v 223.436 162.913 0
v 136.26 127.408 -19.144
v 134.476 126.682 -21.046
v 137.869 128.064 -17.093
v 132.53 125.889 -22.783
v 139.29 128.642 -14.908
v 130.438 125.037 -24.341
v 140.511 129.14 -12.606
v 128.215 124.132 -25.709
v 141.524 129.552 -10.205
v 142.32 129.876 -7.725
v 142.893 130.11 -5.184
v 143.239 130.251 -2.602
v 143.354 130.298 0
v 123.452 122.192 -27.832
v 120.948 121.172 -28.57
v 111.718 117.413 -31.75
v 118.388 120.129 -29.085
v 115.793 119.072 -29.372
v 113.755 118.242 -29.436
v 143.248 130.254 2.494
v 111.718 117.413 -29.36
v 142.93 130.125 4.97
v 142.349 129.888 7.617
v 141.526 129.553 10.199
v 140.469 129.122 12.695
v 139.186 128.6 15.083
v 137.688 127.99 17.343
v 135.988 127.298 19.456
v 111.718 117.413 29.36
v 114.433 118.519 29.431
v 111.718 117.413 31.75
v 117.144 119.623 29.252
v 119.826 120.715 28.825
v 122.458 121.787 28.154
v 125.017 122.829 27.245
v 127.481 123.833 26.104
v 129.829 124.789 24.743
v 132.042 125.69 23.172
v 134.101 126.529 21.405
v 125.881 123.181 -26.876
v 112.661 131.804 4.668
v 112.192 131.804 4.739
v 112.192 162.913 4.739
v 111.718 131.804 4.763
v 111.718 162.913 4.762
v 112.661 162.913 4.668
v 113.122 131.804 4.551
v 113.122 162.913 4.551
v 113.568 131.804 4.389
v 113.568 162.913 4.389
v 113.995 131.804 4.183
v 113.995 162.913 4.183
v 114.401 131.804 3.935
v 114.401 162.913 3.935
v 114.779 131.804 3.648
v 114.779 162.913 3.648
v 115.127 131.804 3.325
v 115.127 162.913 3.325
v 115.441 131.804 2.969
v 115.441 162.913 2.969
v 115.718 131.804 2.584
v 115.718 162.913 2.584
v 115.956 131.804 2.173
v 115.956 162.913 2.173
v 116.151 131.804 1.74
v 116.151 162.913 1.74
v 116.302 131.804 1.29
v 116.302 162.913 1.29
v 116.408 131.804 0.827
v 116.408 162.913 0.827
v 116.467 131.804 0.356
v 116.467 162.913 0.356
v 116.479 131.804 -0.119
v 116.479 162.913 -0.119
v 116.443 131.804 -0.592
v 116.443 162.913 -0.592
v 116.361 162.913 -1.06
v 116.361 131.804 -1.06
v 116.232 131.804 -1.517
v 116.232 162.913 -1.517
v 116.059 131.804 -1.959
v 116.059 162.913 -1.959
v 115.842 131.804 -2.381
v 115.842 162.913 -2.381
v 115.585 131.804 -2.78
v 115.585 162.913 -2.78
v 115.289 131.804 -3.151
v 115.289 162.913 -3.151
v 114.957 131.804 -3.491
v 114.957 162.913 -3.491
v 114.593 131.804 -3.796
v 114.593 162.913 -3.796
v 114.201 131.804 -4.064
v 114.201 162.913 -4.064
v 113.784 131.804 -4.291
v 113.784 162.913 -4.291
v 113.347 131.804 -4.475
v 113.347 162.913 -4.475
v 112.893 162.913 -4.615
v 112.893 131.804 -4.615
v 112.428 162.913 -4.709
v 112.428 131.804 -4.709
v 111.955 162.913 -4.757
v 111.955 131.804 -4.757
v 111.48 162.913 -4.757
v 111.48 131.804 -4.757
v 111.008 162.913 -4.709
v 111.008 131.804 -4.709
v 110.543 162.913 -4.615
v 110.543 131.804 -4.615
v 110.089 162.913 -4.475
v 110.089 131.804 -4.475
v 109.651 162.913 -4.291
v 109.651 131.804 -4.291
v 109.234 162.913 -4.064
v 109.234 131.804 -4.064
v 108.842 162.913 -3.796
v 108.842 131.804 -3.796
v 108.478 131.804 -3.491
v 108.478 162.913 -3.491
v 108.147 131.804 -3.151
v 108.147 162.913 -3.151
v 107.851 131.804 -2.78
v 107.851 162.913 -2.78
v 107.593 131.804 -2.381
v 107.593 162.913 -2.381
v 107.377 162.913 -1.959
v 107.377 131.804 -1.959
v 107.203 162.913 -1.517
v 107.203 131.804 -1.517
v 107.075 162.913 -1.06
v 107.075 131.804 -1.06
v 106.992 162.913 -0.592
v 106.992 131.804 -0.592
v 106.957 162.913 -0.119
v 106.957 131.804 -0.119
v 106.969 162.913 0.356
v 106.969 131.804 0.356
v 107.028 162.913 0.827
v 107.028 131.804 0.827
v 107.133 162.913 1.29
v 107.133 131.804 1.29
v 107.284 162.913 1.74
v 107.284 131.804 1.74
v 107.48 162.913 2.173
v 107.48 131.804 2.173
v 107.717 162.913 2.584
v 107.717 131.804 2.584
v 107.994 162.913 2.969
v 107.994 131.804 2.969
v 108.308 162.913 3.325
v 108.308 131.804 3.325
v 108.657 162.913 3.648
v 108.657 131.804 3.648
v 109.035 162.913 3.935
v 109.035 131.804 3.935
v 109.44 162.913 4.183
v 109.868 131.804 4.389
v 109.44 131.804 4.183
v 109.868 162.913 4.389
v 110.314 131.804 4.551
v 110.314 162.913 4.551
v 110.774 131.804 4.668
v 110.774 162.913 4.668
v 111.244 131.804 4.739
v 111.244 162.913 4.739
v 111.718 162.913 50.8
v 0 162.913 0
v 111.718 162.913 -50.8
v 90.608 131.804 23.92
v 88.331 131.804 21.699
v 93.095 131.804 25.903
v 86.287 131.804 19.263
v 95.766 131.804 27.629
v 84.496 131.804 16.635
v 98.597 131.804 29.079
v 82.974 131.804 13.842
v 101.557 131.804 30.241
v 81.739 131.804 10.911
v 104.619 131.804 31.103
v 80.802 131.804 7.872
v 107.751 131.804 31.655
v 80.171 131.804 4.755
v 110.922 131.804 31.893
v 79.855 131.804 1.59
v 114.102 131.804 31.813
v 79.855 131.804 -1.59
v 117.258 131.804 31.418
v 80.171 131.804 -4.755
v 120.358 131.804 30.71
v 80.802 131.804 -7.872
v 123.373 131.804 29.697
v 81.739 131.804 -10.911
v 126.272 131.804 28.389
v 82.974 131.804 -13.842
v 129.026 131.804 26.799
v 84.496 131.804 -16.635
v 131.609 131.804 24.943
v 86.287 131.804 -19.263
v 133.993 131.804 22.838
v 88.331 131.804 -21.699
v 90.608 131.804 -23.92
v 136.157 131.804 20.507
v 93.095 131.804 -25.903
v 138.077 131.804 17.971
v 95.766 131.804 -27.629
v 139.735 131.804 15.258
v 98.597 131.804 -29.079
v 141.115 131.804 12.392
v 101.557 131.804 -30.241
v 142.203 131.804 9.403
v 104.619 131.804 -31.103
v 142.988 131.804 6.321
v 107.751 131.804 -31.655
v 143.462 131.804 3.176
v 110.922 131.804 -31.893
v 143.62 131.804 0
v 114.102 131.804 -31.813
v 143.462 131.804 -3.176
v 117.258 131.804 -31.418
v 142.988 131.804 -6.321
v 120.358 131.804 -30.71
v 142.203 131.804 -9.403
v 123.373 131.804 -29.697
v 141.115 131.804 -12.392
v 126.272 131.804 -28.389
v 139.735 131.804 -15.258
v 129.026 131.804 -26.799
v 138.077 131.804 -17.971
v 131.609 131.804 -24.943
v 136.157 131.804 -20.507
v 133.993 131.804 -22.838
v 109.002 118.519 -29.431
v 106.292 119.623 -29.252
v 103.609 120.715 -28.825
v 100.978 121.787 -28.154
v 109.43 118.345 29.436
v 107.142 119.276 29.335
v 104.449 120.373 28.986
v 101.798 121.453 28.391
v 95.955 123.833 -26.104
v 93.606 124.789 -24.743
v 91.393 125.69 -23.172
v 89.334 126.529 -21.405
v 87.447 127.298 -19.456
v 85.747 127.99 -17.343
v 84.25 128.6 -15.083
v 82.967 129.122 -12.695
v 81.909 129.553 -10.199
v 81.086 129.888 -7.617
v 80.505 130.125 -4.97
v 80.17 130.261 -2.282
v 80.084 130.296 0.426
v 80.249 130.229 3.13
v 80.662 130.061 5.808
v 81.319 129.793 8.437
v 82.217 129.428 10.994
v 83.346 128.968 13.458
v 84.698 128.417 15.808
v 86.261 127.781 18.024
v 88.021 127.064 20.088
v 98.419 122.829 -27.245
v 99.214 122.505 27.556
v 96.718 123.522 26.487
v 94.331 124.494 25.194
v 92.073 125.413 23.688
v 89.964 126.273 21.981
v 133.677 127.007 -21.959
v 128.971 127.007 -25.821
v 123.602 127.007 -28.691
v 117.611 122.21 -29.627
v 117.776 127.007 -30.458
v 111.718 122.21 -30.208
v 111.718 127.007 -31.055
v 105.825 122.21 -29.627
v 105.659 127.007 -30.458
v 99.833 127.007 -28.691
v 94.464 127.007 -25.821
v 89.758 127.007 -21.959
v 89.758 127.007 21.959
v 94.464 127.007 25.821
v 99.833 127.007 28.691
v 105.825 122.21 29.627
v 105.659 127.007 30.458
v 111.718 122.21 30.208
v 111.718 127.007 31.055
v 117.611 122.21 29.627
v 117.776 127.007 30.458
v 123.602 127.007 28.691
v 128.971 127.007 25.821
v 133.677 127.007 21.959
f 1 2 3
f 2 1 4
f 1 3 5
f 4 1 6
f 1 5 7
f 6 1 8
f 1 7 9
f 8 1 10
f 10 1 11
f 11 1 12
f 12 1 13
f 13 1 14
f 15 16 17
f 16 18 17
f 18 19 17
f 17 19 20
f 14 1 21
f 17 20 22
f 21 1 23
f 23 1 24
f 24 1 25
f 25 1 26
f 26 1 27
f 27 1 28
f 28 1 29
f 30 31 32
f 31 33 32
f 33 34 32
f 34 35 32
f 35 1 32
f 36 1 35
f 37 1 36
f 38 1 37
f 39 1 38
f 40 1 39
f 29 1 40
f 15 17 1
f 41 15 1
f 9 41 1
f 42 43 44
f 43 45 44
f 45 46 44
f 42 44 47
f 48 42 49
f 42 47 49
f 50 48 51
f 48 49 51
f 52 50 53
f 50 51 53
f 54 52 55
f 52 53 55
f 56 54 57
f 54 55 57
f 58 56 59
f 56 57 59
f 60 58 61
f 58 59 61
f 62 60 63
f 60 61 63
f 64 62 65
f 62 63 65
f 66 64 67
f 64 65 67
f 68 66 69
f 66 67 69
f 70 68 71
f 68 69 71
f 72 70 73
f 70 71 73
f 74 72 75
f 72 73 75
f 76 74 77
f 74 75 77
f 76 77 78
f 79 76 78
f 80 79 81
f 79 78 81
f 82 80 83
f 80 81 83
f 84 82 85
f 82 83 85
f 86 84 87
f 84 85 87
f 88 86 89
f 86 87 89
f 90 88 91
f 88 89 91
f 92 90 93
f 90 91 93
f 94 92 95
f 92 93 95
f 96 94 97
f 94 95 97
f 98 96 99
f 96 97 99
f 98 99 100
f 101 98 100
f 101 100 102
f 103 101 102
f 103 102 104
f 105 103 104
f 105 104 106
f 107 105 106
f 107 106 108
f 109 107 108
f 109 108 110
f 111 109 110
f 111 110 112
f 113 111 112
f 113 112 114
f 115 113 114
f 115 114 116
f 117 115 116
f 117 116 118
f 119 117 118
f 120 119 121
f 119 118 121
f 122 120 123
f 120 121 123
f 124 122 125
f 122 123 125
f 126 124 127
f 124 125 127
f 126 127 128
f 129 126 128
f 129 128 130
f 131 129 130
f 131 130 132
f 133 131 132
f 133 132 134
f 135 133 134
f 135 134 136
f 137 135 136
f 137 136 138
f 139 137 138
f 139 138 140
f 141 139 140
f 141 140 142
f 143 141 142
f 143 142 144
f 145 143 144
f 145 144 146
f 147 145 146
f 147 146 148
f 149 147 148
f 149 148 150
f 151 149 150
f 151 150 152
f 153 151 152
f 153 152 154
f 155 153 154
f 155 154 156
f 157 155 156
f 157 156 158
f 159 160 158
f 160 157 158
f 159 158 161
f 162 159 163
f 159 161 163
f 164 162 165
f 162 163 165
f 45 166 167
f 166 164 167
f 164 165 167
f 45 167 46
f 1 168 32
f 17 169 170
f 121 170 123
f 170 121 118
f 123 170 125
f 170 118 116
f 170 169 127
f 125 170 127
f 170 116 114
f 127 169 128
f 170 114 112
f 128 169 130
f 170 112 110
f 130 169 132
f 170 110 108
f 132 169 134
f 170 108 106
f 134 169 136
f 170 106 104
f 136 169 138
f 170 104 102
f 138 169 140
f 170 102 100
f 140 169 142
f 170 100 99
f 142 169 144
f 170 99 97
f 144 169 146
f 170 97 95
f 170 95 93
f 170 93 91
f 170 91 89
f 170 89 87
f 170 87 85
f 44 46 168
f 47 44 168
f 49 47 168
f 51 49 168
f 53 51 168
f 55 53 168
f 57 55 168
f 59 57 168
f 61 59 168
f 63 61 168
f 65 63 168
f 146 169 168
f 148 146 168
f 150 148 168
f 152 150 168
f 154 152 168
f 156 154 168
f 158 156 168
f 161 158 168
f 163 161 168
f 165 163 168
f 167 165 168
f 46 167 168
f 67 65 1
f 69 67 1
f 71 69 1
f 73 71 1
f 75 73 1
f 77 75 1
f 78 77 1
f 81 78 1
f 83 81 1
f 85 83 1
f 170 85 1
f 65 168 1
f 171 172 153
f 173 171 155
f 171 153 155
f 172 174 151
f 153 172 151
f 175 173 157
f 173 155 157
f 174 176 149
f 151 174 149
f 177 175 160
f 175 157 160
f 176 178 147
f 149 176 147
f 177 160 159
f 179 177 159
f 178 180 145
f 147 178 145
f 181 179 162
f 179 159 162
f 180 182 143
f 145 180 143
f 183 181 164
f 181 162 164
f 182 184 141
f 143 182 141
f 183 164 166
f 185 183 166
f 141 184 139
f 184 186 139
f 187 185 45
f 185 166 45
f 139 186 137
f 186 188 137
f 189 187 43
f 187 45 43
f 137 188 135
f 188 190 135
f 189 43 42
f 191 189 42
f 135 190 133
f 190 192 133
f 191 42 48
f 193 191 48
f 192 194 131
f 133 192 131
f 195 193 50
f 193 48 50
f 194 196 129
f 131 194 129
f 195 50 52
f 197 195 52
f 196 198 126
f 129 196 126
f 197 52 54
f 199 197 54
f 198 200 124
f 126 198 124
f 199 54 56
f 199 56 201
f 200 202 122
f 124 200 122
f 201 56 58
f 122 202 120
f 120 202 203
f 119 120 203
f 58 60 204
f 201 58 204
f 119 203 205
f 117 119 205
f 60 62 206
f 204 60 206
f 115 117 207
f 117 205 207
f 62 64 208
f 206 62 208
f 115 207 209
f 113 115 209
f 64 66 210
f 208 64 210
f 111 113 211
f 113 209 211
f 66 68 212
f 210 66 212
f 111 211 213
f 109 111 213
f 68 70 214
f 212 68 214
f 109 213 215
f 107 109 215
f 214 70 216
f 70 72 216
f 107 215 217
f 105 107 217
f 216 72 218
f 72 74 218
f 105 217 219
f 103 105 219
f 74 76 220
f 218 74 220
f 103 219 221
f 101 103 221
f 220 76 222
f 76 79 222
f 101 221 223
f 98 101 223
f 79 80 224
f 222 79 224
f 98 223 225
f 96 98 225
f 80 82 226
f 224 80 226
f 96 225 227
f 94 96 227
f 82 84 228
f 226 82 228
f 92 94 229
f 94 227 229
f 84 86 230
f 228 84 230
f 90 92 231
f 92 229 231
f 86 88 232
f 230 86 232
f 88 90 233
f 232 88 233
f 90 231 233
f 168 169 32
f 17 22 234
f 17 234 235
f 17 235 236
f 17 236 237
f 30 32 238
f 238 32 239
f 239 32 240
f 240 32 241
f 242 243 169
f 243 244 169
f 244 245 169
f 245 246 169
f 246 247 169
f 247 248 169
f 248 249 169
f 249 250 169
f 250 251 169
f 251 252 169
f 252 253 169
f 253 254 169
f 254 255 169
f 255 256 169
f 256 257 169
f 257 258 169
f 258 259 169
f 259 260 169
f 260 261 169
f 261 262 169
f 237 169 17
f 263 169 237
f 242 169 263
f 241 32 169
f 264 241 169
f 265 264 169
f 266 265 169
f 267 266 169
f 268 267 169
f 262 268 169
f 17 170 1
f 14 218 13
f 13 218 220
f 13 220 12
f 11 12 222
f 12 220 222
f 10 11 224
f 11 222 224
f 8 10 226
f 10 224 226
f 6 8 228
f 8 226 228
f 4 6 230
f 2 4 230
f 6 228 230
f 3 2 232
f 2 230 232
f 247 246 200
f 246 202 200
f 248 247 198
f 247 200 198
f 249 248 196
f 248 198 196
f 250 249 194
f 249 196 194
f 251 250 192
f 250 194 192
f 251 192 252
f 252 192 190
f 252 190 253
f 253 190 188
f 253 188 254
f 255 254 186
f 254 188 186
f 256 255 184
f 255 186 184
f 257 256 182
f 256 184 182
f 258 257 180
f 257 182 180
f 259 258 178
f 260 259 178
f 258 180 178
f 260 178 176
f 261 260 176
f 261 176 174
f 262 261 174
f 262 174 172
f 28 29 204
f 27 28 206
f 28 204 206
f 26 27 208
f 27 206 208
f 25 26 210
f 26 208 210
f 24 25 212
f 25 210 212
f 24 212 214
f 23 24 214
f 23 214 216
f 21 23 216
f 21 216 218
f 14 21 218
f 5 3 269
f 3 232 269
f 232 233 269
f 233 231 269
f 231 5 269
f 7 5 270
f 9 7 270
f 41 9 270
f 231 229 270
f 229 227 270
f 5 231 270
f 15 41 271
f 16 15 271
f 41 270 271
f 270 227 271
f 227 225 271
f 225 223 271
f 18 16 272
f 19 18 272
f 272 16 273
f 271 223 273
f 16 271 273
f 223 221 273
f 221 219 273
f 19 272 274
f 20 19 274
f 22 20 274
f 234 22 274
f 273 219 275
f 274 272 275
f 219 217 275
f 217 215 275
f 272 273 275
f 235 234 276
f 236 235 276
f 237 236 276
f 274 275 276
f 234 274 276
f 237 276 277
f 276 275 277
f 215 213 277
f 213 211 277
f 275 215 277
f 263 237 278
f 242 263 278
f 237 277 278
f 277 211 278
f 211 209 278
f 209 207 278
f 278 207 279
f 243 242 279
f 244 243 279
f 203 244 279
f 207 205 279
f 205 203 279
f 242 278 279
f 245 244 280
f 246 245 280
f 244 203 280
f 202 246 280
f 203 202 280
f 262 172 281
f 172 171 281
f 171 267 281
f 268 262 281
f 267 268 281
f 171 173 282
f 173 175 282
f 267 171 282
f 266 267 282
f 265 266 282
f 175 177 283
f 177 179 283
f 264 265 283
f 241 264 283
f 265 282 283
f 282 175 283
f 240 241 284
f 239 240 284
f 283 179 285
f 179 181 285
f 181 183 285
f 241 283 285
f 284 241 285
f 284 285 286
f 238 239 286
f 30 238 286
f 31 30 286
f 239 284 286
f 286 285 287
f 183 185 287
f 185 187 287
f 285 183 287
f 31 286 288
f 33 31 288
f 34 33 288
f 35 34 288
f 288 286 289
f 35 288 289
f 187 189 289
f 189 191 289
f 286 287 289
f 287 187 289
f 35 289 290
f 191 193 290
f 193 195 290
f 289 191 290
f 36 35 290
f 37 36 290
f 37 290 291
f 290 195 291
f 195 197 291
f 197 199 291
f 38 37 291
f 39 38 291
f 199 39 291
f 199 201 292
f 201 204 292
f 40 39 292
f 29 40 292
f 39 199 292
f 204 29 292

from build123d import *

# Parameters (mm, degrees)
BOSS_EXTRUDE1_DEPTH = 50.8
CUT_EXTRUDE1_REACH  = 267.827
SKETCH3_W           = 270.689015678
SKETCH3_H           = 127.641974873
SKETCH4_W           = 182.593572116
SKETCH4_H           = 90.656556142
CUT_EXTRUDE2_DEPTH  = 276.287495976
SKETCH5_R           = 4.7625
CUT_EXTRUDE3_DEPTH  = 234.611541089


# Read off the part's stored shape, not the designer's step: Cavity1
with BuildPart() as part:
    # Sketch1 → Boss-Extrude1 (new body)
    with BuildSketch(Plane.XY):
        Polygon((0, 162.912922238), (223.435555158, 162.912922238), (111.717777579, 117.412759364), align=None)
    boss_extrude1 = extrude(amount=BOSS_EXTRUDE1_DEPTH)

    # Sketch3 → Cut-Extrude1 (cut, up to next)
    with BuildSketch(Plane(origin=(22.441501566, 20.662959115, -49.352651191), x_dir=(0.9221668342969159, -0.1493780822790374, 0.35678357341312894), z_dir=(-0.38679235995919625, -0.3561381441534573, 0.8506217094314763)), mode=Mode.PRIVATE) as cut_extrude1_sk1:
        with Locations((94.443721281, 144.982742911)):
            Rectangle(SKETCH3_W, SKETCH3_H)
    cut_extrude1_tool1 = extrude(cut_extrude1_sk1.sketch, amount=CUT_EXTRUDE1_REACH, mode=Mode.PRIVATE) & part.part
    cut_extrude1 = cut_extrude1_tool1.solids().sort_by_distance((109.534369, 140.289581, 40.33523))[0]
    add(cut_extrude1, mode=Mode.SUBTRACT)

    # Sketch4 → Cut-Extrude2 (cut, through all)
    with BuildSketch(Plane(origin=(10.986318642, -10.115626722, 24.160769733), x_dir=(0.9221668342969159, 0.14937808227903746, -0.35678357341312883), z_dir=(0.3867923599591962, -0.3561381441534575, 0.8506217094314763))):
        with Locations((161.909836557, 133.814028117)):
            Rectangle(SKETCH4_W, SKETCH4_H)
    cut_extrude2 = extrude(amount=CUT_EXTRUDE2_DEPTH, mode=Mode.SUBTRACT)

    # Mirror1: Boss-Extrude1, Cut-Extrude1, Cut-Extrude2 across plane
    add(boss_extrude1.mirror(Plane.XY))
    add(cut_extrude1.mirror(Plane.XY), mode=Mode.SUBTRACT)
    add(cut_extrude2.mirror(Plane.XY), mode=Mode.SUBTRACT)

    # Sketch5 → Cut-Extrude3 (cut, through all)
    with BuildSketch(Plane(origin=(0, 162.912922238, 0), x_dir=(1, 0, 0), z_dir=(0, 1, 0))):
        with Locations(Location((111.717777579, 0, 0), (0, 0, 270))):
            Circle(SKETCH5_R)
    extrude(amount=-CUT_EXTRUDE3_DEPTH, mode=Mode.SUBTRACT)

    # Cavity1 outline → Cavity1 (revolve, cut)
    with BuildSketch(Plane(origin=(111.717777579, 0, 0), x_dir=(1, 0, 0), z_dir=(0, 0, 1))):
        Polygon((31.902660281, 131.804308366), (4.7625, 131.804308366), (4.7625, 117.412759364), (29.360304621, 117.412759364), align=None)
    revolve(axis=Axis((111.717777579, 0, 0), (0, 1, 0)), mode=Mode.SUBTRACT)


solid = part.part
